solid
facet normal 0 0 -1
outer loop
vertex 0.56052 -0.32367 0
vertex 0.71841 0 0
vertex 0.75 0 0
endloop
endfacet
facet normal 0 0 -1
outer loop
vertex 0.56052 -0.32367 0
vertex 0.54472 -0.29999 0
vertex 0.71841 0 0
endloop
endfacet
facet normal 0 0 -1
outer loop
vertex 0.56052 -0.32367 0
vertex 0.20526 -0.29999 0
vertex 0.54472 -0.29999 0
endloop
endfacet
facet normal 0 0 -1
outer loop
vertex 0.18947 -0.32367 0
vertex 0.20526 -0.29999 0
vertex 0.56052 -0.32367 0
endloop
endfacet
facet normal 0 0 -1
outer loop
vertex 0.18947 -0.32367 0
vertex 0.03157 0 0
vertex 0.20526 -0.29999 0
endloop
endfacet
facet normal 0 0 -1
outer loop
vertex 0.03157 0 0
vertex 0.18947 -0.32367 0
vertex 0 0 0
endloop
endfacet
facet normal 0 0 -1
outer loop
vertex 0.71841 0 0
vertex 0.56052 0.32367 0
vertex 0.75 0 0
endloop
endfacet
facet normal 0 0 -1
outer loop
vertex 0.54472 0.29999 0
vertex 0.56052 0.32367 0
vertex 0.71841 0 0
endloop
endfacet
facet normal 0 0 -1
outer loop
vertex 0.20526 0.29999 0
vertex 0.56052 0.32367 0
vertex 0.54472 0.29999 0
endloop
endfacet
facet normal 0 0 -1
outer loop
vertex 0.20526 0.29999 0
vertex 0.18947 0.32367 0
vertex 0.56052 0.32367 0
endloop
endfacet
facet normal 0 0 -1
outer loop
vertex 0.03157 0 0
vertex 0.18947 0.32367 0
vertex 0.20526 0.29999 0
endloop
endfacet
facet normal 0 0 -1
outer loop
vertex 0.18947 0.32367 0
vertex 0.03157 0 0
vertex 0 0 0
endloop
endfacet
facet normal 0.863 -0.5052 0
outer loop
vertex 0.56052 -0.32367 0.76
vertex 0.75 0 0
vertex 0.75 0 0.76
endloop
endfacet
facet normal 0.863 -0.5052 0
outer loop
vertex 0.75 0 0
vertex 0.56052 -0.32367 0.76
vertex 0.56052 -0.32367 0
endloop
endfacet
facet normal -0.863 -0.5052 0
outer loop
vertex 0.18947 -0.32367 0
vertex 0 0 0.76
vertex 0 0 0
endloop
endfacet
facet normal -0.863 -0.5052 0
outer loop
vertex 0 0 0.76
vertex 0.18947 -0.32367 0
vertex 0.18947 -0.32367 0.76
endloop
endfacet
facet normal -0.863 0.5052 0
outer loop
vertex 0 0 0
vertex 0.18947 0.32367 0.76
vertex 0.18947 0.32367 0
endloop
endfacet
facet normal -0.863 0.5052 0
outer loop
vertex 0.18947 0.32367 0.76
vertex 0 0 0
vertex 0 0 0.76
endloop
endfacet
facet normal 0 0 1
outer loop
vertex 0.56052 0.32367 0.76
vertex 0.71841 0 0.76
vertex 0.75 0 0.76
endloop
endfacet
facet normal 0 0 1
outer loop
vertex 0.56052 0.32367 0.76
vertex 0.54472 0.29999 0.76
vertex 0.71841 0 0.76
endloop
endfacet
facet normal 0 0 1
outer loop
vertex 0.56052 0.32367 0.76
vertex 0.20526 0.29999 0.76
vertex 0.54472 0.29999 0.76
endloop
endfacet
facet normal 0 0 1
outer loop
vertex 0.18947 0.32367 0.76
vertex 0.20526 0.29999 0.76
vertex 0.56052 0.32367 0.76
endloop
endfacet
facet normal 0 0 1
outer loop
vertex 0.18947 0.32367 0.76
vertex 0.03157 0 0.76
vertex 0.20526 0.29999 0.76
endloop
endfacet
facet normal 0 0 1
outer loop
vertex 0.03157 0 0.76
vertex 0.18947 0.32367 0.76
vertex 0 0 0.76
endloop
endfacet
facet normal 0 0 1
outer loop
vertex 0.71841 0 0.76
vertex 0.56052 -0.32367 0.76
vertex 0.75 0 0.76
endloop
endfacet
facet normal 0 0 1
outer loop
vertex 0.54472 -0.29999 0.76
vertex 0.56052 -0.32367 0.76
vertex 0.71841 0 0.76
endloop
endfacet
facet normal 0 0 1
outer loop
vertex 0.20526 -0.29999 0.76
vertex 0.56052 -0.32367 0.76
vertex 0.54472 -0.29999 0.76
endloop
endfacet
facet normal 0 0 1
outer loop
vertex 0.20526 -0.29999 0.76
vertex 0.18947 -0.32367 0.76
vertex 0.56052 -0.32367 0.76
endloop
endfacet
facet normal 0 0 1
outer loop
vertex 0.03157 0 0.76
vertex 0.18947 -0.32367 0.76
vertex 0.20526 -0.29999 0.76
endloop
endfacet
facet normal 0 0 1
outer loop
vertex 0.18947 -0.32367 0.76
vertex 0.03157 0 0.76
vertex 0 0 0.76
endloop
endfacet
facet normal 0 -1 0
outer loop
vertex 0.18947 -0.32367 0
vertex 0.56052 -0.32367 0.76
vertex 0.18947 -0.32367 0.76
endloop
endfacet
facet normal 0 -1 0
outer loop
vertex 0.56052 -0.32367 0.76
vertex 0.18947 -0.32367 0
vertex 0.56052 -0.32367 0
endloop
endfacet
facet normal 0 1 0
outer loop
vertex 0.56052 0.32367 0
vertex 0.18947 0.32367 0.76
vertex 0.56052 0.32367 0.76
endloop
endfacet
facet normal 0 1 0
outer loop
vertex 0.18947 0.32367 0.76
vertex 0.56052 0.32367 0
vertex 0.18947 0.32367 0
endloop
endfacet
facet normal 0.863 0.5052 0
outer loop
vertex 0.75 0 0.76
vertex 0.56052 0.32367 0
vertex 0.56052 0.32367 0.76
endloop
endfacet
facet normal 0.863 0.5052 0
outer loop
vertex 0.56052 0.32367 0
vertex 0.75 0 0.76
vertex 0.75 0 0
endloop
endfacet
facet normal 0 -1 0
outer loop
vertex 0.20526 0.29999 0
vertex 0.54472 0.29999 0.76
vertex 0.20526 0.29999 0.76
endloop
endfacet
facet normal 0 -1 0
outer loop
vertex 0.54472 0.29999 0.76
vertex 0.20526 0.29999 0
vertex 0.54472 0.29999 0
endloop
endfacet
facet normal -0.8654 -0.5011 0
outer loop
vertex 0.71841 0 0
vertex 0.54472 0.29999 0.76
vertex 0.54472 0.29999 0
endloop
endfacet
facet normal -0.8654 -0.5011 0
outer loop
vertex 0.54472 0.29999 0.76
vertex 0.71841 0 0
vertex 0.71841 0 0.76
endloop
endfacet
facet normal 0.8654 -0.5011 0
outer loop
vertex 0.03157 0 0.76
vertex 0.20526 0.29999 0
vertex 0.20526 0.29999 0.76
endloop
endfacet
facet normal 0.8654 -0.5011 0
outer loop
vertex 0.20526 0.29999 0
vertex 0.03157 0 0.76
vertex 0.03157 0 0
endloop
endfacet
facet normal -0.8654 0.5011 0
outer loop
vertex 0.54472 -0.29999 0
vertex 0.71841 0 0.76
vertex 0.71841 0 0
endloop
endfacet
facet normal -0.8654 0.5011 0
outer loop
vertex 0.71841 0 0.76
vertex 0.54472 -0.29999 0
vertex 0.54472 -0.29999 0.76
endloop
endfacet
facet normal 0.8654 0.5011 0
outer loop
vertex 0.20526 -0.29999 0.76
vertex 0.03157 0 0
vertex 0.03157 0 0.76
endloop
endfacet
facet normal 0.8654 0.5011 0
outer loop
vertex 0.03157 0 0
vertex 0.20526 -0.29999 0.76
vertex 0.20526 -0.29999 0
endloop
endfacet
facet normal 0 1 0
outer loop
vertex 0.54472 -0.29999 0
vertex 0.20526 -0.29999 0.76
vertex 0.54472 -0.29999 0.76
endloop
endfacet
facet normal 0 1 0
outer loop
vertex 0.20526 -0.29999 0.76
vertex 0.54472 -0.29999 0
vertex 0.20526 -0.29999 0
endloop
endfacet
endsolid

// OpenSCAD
EPS = 0.01;

module sketch0() {
    polygon(points=[
        [0.18947368421052632, -0.3236842105263158],
        [0.5605263157894737, -0.3236842105263158],
        [0.75, 0.0],
        [0.5605263157894737, 0.3236842105263158],
        [0.18947368421052632, 0.3236842105263158],
        [0.0, 0.0]
    ]);
}

module sketch1() {
    polygon(points=[
        [0.20526315789473684, -0.3],
        [0.5447368421052632, -0.3],
        [0.718421052631579, 0.0],
        [0.5447368421052632, 0.3],
        [0.20526315789473684, 0.3],
        [0.031578947368421054, 0.0]
    ]);
}

difference() {
    linear_extrude(height=0.75 + EPS)
        sketch0();
    translate([0, 0, -EPS])
        linear_extrude(height=0.75 + 2*EPS)
            sketch1();
}
